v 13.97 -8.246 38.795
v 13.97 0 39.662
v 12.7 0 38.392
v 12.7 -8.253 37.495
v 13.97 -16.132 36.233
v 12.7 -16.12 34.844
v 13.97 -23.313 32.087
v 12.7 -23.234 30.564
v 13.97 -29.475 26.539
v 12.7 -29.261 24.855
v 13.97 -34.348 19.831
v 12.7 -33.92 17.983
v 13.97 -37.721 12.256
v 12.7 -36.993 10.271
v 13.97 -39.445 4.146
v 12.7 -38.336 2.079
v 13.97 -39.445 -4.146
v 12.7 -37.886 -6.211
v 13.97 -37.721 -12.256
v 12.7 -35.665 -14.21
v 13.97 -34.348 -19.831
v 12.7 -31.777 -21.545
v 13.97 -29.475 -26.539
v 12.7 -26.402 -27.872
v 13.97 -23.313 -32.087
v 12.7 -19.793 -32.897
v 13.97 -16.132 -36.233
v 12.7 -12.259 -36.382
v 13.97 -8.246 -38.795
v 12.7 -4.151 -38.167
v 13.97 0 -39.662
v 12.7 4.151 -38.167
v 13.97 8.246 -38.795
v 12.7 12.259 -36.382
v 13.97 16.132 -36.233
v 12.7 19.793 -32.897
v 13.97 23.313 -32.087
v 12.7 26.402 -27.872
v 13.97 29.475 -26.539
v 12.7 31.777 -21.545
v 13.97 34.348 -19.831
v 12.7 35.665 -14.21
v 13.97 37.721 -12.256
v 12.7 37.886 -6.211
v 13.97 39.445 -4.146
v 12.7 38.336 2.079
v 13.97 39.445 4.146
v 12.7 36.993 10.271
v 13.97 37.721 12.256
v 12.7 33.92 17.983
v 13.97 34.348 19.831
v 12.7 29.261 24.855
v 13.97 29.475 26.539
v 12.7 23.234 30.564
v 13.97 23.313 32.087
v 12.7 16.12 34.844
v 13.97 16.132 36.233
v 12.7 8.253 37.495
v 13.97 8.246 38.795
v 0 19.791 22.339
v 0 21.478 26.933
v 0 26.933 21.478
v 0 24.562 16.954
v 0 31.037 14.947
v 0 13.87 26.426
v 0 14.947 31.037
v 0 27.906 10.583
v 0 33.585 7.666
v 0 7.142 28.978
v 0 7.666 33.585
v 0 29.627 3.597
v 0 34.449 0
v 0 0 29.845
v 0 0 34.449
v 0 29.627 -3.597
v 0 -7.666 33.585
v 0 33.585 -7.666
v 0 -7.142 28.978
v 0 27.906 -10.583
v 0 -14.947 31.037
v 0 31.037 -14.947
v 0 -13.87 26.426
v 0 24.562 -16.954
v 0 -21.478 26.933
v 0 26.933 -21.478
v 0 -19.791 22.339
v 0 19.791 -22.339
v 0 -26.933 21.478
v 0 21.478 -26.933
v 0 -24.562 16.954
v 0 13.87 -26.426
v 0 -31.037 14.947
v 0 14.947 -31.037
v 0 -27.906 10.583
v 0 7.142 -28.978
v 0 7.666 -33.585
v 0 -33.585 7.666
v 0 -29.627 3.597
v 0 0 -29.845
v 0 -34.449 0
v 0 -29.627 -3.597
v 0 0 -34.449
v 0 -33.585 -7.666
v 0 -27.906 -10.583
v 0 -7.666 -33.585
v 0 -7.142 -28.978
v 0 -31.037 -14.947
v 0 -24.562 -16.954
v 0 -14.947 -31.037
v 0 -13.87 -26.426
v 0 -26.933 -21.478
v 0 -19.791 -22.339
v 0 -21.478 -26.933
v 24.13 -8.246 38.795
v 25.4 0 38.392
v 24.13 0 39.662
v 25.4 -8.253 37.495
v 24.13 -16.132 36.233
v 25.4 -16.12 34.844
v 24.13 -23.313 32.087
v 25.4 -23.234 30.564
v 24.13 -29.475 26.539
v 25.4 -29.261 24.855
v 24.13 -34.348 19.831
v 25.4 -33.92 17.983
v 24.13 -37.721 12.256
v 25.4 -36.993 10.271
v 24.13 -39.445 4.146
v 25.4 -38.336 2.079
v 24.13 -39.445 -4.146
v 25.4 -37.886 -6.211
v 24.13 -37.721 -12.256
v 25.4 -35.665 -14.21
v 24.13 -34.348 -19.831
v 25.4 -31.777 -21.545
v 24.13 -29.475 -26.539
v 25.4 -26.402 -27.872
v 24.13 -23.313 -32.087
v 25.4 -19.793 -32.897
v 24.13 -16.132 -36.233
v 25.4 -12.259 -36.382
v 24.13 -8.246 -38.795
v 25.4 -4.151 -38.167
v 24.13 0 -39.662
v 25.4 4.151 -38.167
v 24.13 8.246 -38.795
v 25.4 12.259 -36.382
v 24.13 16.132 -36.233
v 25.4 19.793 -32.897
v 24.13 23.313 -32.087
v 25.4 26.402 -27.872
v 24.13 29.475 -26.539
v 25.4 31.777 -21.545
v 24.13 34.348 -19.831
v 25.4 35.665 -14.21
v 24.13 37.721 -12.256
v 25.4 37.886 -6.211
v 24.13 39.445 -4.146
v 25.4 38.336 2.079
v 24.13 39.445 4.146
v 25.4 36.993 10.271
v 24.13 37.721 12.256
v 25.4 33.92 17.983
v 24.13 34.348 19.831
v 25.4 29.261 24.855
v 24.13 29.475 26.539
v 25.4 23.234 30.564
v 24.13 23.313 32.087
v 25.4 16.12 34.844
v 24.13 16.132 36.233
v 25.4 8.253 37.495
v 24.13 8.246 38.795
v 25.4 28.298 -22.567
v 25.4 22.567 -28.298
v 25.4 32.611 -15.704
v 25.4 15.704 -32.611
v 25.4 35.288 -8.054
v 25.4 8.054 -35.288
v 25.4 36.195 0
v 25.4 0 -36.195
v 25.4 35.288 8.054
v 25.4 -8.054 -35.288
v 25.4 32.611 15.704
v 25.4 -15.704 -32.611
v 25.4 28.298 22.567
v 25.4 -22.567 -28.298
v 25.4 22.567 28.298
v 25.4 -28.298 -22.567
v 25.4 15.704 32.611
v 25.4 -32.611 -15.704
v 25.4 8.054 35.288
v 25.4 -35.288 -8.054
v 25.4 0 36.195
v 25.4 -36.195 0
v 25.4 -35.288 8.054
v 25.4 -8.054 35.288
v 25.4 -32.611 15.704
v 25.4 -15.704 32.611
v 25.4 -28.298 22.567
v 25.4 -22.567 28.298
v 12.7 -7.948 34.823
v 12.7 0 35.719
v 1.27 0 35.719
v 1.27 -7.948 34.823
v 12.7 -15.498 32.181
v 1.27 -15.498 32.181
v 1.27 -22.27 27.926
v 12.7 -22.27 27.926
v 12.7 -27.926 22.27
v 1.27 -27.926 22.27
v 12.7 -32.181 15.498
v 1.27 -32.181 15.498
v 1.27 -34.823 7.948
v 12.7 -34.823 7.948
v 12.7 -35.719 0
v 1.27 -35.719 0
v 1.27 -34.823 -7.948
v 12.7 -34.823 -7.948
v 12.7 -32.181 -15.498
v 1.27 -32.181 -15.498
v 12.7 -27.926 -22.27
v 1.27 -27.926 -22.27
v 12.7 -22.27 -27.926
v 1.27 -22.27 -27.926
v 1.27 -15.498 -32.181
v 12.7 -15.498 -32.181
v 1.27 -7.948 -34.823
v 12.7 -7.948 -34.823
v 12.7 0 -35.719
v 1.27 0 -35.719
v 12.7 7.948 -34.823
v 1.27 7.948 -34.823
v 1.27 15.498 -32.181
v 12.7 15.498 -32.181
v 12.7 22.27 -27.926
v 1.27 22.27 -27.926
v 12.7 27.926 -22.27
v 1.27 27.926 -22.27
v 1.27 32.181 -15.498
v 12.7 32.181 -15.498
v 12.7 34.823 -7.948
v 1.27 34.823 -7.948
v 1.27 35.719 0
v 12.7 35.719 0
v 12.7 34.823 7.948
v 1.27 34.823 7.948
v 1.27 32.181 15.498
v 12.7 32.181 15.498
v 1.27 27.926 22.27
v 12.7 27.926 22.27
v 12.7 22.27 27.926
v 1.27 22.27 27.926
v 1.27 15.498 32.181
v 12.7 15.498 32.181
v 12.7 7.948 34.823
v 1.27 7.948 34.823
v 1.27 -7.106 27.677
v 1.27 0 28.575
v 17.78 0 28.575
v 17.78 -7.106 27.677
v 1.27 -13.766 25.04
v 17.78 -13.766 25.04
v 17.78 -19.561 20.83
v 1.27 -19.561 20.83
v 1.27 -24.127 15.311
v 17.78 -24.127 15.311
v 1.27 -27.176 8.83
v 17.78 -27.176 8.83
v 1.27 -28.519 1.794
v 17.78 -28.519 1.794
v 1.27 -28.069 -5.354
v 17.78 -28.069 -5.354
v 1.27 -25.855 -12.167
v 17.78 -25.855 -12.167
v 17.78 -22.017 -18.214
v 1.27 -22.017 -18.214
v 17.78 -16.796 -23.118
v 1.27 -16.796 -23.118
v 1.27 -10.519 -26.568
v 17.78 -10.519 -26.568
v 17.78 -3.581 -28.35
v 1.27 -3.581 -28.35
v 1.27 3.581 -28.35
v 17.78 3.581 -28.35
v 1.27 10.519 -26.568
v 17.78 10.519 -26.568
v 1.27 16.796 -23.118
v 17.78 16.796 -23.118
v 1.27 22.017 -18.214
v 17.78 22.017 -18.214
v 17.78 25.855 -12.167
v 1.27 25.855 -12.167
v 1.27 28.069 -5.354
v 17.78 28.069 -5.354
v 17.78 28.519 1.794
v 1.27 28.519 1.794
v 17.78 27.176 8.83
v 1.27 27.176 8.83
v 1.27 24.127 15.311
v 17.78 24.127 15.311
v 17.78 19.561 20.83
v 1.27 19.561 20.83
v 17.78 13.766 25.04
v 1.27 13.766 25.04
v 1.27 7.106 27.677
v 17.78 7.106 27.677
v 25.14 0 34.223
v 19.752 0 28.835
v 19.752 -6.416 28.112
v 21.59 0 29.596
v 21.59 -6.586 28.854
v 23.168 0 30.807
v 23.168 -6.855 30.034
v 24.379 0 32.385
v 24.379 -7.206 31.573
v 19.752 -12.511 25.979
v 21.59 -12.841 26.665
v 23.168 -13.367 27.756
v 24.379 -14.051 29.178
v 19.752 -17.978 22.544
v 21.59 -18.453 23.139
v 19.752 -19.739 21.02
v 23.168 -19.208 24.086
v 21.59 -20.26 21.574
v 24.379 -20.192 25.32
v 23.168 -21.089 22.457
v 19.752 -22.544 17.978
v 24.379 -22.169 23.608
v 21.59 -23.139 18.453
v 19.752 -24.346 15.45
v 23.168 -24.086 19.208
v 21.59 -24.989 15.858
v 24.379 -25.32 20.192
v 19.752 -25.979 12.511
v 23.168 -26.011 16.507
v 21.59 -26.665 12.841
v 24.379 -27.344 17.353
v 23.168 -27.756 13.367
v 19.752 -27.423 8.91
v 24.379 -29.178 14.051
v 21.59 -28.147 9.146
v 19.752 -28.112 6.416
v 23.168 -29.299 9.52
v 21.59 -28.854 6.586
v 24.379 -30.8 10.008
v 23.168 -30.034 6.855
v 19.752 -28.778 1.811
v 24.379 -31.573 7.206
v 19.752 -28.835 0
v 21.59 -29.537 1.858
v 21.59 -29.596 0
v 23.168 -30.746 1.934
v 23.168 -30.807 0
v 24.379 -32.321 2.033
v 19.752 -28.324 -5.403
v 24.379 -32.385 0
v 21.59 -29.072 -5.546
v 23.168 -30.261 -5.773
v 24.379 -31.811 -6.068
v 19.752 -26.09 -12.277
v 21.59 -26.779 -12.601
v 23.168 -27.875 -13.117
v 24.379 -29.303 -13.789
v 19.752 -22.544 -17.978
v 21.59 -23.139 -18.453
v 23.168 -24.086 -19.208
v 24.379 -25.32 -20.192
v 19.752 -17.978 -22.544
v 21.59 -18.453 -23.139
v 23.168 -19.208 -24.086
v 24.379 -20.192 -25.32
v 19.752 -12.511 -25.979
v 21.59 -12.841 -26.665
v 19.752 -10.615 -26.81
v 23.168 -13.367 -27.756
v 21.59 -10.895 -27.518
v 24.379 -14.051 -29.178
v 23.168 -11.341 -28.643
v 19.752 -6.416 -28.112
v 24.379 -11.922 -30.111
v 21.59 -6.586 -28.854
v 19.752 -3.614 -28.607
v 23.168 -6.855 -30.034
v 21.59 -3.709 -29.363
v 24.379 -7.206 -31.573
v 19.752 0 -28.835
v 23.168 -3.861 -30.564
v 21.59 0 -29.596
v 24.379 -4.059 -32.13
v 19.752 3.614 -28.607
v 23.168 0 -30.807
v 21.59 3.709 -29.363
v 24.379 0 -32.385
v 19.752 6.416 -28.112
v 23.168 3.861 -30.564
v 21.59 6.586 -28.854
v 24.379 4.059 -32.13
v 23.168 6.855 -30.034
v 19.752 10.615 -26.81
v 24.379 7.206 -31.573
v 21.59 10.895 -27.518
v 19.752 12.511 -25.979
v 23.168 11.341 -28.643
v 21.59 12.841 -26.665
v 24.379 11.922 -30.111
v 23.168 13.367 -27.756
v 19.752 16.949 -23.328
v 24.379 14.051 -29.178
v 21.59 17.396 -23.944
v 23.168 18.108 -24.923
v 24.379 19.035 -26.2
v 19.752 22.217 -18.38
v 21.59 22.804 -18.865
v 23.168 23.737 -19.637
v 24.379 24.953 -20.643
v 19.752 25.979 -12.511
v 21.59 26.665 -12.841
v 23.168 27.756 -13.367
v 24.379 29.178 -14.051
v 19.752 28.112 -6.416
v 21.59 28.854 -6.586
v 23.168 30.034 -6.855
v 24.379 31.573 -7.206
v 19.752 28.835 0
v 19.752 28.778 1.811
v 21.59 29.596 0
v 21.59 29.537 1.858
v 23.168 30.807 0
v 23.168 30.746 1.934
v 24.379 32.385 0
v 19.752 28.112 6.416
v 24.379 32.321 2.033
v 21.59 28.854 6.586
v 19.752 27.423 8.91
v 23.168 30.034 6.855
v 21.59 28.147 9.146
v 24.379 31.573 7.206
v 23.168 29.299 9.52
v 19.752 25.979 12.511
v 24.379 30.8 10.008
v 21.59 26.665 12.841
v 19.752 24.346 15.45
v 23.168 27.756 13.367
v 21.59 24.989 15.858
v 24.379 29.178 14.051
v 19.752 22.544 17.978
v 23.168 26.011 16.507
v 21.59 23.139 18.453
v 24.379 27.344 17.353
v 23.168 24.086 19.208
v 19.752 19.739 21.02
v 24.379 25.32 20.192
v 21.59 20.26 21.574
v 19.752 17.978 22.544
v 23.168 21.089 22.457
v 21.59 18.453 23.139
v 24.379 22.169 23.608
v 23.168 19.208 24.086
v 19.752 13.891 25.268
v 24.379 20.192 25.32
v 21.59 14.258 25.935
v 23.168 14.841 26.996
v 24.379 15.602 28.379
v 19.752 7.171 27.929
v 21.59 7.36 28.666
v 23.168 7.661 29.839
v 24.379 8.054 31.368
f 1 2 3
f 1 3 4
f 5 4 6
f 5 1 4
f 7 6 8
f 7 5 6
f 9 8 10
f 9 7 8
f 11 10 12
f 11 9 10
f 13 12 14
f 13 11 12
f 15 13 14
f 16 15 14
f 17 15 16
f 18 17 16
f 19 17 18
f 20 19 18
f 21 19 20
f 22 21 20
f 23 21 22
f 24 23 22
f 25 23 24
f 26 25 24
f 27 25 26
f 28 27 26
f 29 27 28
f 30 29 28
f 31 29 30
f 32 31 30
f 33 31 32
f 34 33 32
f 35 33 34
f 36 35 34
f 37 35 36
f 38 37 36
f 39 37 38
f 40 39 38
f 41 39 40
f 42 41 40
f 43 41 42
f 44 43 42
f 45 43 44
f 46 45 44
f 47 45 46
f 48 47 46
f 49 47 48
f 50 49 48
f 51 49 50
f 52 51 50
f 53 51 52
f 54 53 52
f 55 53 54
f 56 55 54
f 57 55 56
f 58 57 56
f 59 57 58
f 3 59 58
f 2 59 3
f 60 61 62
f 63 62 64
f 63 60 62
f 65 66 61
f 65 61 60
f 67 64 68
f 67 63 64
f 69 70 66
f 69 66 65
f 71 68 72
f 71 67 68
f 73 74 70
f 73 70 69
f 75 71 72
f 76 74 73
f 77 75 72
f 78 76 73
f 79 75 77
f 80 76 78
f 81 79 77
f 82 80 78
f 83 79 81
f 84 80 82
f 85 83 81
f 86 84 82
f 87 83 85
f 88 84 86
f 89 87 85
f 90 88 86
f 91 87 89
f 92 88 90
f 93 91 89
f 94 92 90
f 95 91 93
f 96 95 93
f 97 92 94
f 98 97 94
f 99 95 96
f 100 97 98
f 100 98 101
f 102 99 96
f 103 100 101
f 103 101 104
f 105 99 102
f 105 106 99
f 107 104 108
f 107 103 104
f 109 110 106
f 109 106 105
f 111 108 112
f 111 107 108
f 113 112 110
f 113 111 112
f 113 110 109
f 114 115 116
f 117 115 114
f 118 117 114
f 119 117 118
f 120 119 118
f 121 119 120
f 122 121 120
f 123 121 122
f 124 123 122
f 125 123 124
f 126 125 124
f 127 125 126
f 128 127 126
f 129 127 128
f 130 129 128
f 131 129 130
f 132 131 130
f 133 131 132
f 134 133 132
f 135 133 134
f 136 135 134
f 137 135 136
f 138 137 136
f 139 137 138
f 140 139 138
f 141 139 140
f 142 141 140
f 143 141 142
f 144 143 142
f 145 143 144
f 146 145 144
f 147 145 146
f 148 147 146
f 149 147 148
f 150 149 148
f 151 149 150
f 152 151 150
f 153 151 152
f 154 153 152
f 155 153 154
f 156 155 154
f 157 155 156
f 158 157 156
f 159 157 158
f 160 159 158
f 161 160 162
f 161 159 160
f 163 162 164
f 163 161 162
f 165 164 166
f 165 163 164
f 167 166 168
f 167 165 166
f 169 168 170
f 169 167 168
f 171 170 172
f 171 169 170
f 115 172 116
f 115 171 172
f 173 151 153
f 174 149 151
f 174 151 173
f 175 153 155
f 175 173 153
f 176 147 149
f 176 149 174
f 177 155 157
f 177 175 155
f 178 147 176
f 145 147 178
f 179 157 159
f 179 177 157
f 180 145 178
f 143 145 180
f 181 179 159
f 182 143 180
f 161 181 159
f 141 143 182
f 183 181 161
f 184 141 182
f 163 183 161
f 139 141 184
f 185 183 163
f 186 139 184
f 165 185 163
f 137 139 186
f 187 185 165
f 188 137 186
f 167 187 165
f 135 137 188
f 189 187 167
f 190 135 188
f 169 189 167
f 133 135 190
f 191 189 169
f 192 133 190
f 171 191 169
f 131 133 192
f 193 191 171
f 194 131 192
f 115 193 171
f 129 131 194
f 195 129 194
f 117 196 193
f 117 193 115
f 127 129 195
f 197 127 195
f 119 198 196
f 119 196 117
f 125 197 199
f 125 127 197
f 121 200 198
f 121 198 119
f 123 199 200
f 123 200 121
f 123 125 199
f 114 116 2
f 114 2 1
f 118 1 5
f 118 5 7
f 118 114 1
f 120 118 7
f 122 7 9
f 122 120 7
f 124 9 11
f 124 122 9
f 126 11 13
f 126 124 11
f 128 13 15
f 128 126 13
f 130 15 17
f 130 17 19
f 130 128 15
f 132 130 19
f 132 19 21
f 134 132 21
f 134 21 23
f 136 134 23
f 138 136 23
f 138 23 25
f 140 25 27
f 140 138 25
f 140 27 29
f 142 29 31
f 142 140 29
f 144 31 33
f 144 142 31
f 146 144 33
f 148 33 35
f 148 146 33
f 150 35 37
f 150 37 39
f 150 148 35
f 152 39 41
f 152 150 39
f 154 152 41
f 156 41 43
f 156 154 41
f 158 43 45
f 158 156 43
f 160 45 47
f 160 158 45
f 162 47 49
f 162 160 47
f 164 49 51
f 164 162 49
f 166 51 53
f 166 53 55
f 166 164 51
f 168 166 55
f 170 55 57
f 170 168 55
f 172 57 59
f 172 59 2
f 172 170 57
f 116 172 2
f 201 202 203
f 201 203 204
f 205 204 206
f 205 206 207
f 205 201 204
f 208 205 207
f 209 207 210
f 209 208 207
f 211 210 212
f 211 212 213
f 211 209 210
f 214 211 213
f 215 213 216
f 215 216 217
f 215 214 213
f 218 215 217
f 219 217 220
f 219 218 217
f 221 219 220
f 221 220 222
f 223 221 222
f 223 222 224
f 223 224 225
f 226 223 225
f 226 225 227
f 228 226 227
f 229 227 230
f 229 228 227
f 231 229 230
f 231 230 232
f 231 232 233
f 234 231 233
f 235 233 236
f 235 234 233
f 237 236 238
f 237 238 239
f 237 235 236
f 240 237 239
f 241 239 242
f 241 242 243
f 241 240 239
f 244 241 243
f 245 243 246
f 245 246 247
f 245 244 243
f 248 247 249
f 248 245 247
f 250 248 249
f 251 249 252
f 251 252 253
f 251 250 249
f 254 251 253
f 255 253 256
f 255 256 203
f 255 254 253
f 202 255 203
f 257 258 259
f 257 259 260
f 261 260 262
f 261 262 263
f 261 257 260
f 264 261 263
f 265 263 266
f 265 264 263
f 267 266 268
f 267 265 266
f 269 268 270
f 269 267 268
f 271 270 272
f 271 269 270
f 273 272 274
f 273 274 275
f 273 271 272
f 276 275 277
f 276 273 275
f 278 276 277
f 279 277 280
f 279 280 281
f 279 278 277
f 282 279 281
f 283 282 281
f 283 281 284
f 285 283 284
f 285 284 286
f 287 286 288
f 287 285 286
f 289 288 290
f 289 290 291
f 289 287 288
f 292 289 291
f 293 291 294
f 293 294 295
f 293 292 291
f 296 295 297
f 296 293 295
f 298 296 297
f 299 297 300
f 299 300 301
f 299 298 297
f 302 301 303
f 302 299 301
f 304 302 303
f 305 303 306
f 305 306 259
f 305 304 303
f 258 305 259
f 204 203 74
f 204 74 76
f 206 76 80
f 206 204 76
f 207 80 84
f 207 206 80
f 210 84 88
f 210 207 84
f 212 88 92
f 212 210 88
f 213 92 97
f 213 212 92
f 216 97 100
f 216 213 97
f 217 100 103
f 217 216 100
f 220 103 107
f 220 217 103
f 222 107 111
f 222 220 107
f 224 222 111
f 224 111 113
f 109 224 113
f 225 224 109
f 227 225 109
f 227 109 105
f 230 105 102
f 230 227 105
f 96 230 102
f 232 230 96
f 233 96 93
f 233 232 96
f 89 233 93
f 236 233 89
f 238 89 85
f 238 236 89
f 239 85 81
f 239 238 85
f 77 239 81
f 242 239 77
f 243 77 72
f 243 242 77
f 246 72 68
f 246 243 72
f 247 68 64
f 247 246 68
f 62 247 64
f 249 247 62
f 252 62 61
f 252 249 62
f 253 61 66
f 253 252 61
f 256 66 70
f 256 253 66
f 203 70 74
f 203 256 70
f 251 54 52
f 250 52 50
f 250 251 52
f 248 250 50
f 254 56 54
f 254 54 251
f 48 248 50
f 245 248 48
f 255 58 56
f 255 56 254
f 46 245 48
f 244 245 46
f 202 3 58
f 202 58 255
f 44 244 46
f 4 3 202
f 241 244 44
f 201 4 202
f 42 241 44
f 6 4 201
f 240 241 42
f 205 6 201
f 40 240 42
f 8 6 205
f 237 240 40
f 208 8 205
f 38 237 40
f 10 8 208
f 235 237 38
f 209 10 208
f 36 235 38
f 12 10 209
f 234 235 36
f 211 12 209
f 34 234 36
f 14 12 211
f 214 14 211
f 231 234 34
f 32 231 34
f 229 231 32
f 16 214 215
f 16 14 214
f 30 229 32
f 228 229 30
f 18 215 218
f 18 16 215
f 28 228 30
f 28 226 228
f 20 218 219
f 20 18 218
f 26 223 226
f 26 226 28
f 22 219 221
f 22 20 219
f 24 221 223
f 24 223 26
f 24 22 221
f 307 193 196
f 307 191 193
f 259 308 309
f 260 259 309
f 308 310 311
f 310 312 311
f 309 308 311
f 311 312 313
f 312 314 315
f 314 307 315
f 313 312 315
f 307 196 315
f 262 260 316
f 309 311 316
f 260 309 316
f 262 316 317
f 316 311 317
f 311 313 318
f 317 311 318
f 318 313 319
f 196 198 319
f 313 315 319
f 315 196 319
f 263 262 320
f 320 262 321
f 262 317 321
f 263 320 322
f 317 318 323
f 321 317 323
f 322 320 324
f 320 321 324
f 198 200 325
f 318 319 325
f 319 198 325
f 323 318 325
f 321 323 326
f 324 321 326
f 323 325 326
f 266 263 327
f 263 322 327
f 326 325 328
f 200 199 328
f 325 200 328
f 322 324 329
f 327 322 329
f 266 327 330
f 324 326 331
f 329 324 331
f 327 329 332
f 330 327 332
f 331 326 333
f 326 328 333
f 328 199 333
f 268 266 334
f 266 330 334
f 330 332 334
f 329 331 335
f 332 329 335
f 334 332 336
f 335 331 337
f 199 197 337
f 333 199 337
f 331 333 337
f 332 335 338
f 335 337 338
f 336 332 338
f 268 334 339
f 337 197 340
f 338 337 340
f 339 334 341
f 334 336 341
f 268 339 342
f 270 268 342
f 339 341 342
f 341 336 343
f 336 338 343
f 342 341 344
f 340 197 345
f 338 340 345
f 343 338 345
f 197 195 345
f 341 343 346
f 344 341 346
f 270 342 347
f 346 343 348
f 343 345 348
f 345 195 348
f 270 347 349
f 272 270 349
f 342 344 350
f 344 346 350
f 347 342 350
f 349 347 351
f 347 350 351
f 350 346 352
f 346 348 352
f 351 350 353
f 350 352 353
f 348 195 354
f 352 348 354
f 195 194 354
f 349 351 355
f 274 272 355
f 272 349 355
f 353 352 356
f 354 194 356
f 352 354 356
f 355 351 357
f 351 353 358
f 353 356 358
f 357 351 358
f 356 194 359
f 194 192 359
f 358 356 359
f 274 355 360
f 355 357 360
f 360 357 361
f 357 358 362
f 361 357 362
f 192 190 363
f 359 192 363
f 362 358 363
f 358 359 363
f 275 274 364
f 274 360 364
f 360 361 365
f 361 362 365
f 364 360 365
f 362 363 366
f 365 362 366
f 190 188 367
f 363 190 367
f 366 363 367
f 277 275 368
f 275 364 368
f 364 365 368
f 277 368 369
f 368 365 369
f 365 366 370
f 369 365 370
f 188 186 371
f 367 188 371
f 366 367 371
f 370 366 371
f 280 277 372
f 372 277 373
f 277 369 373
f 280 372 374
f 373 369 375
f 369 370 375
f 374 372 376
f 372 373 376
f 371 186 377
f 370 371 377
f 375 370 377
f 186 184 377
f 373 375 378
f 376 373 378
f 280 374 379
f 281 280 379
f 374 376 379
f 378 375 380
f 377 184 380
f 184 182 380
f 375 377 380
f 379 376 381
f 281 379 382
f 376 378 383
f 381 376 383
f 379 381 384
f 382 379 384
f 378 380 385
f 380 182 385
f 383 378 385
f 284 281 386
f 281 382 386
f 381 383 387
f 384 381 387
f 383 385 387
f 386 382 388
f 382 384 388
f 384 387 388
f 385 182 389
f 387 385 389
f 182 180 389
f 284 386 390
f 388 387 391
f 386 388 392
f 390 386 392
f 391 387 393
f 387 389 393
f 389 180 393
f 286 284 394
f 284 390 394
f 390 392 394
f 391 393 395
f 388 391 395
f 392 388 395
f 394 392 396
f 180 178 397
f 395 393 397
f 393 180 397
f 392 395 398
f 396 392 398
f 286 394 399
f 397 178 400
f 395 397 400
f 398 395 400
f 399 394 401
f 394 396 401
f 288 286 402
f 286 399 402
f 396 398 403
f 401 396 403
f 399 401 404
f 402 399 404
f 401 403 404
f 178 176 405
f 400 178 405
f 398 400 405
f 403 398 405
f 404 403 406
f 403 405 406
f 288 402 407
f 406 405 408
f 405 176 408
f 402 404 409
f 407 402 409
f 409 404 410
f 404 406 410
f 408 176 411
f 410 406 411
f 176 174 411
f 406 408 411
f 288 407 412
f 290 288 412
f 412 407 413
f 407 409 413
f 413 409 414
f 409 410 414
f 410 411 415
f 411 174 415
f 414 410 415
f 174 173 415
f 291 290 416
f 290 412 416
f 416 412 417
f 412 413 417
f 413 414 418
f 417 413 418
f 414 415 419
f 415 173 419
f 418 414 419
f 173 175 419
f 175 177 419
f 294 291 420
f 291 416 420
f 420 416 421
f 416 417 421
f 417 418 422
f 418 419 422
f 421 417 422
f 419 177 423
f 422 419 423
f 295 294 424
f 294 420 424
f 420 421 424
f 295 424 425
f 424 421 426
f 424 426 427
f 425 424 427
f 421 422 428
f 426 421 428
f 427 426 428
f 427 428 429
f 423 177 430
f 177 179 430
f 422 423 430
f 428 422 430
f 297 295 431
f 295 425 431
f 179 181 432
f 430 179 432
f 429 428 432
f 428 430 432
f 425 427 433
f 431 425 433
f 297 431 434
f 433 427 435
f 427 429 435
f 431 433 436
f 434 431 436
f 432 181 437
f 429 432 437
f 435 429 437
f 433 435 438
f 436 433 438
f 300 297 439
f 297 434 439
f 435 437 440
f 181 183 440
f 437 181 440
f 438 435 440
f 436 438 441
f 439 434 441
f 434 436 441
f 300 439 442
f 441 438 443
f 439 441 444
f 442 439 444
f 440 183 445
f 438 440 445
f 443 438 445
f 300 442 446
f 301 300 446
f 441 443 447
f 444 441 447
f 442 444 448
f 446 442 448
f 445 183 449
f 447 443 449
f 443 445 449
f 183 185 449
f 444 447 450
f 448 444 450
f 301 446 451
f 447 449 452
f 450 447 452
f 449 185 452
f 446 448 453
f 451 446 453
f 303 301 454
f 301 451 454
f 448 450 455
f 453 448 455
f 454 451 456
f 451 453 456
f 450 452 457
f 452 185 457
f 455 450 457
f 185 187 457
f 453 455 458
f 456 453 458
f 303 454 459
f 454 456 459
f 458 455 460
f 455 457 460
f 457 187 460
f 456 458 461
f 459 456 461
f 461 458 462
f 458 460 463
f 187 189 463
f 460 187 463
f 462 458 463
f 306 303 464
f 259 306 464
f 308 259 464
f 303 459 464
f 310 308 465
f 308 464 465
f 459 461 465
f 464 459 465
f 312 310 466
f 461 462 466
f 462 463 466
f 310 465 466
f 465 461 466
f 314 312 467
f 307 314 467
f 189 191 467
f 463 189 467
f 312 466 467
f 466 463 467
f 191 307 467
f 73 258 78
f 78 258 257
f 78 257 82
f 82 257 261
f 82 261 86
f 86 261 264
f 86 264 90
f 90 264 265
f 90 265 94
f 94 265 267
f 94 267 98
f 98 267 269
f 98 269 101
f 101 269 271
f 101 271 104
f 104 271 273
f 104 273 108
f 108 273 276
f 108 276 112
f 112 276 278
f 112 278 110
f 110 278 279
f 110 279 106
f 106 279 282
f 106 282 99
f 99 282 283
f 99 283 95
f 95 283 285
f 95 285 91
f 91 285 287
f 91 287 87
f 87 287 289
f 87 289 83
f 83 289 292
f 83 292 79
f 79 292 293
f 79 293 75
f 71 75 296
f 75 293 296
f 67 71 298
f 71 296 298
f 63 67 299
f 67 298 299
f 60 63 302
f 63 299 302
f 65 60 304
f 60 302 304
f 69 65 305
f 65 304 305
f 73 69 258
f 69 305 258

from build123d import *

# Parameters (mm, degrees)
CHAMFER1_SIZE = 1.27
FILLET1_R     = 7.62


with BuildPart() as part:
    # Sketch1 → Revolve1 (revolve)
    with BuildSketch(Plane.XY, mode=Mode.PRIVATE) as revolve1_sk:
        Polygon((0, 28.575), (0, 35.71875), (12.7, 35.71875), (12.7, 39.6621), (25.4, 39.6621), (25.4, 28.575), align=None)
    revolve(revolve1_sk.sketch.rotate(Axis((-88.99, 0, 0), (1, 0, 0)), 90), axis=Axis((-88.99, 0, 0), (1, 0, 0)))

    # Chamfer1
    chamfer1_edges = [part.edges().sort_by_distance(p)[0] for p in [
        (25.4, 0, -39.6621),
        (12.7, 0, -39.6621),
        (0, 0, -35.71875),
        (0, 0, -28.575),
    ]]
    chamfer(chamfer1_edges, length=CHAMFER1_SIZE)

    # Fillet1
    fillet1_edges = [part.edges().sort_by_distance(p)[0] for p in [
        (25.4, 0, -28.575),
    ]]
    fillet(fillet1_edges, radius=FILLET1_R)


solid = part.part
